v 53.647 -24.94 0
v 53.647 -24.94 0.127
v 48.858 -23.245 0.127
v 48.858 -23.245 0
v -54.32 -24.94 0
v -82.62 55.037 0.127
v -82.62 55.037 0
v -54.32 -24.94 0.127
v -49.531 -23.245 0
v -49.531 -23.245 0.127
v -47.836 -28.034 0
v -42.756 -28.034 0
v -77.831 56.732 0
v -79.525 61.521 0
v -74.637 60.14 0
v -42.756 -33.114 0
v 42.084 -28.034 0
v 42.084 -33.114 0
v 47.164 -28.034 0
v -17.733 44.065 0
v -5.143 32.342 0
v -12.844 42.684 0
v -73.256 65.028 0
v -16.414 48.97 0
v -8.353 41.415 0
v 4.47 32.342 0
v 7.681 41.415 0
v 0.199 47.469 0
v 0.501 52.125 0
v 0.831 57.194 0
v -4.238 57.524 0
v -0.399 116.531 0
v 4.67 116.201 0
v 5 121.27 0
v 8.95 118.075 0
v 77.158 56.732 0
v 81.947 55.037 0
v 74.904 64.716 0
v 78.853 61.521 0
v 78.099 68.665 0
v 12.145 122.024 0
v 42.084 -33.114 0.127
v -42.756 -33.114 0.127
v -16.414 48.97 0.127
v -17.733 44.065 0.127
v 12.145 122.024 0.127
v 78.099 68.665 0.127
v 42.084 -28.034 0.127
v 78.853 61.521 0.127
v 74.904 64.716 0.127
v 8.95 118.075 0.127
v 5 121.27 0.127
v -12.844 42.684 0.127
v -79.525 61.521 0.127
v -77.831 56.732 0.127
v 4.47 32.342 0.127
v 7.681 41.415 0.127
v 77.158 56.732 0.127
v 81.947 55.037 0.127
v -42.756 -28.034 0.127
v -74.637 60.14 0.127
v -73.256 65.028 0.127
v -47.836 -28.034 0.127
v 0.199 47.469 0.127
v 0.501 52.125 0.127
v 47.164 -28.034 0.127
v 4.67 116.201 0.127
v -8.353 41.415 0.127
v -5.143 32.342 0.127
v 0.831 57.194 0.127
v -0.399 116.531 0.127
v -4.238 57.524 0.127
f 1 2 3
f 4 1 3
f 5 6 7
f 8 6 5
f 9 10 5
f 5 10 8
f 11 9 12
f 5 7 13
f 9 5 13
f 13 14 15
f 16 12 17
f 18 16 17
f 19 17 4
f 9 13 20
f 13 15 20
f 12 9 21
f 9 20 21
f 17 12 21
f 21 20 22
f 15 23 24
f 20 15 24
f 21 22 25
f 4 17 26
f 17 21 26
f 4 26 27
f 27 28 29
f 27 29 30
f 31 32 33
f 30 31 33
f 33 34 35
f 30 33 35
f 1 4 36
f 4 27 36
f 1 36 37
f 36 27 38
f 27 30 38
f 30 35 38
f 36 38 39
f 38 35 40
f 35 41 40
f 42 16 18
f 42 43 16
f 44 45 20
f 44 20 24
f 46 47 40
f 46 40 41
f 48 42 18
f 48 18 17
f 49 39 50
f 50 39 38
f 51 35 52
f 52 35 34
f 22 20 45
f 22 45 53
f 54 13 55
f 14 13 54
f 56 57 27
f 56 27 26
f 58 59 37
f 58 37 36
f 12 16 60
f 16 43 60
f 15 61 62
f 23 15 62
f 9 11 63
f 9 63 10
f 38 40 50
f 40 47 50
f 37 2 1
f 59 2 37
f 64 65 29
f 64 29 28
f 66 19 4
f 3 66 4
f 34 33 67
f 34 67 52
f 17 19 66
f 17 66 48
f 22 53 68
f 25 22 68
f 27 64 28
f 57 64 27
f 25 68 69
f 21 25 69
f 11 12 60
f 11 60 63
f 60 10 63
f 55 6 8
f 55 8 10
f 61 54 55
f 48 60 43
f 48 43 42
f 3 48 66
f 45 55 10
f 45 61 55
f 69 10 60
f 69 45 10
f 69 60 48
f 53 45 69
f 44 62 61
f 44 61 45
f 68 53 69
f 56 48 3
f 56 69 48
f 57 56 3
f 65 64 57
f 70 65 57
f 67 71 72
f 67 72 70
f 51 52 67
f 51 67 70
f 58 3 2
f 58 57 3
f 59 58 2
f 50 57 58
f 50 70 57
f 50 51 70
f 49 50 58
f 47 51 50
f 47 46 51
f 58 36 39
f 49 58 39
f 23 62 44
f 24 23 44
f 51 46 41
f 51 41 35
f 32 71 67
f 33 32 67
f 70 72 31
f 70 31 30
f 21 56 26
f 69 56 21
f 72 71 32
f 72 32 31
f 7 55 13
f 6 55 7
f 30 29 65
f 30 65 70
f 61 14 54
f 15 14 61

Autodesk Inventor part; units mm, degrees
ref_plane "YZ Plane" through (0, 0, 0) normal (1, 0, 0) x (0, 1, 0)
ref_plane "XZ Plane" through (0, 0, 0) normal (0, 1, 0) x (-1, 0, 0)
ref_plane "XY Plane" through (0, 0, 0) normal (0, 0, 1) x (1, 0, 0)
sketch "Sketch1" plane through (0, 0, 0) normal (0, 0, 1) x (1, 0, 0)
  line L0 (-7.8362, 28.532) -> (7.1638, 28.532)
  line L1 (47.1638, -28.0341) -> (-47.8362, -28.0341)
  line L2 (7.1638, 28.532) -> (47.1638, -28.0341)
  line L3 (-7.8362, 28.532) -> (-47.8362, -28.0341)
  line L4 (-7.8362, 28.532) -> (-12.8438, 42.6835)
  line L5 (0.5011, 52.1252) -> (12.1714, 42.6835)
  line L6 (12.1714, 42.6835) -> (7.1638, 28.532)
  line L7 (-47.8362, -28.0341) -> (-79.5254, 61.5206)
  line L8 (-79.5254, 61.5206) -> (-12.8438, 42.6835)
  line L9 (47.1638, -28.0341) -> (78.853, 61.5206)
  line L10 (78.853, 61.5206) -> (12.1714, 42.6835)
  line L11 (78.853, 61.5206) -> (5.0003, 121.2702)
  line L12 (0.5011, 52.1252) -> (5.0003, 121.2702)
  point P0 (0, 0)
  point P1 (-0.3362, 28.532)
  point P2 (-0.3362, -28.0341)
  dimension "d0" = 69.28
  dimension "d1" = 95
  dimension "d2" = 15
  dimension "d3" = 56.566
  dimension "d4" = 69.28
  dimension "d16" = 15.0114
  dimension "d17" = 15.0114
  dimension "d18" = 15.0114
  dimension "d19" = 94.996
  dimension "d20" = 69.2912
  dimension "d21" = 94.996
  dimension "d22" = 69.2912
  dimension "d23" = 94.996
  dimension "d24" = 69.2912
extrude "Extrusion2" add sketch "Sketch1" along normal blind 0.127
sketch "Sketch2" plane through (0, 0, 0.127) normal (0, 0, 1) x (1, 0, 0)
  line L0 (47.1638, -28.0341) -> (78.853, 61.5206) projected
  line L1 (53.6474, -24.9397) -> (81.9474, 55.0369)
  line L2 (78.0988, 68.6651) -> (12.1448, 122.0244)
  line L3 (5.0003, 121.2702) -> (0.5011, 52.1252) projected
  line L4 (-0.3988, 116.5308) -> (-4.2384, 57.5244)
  line L5 (-79.5254, 61.5206) -> (-47.8362, -28.0341) projected
  line L6 (-82.6198, 55.0369) -> (-54.3198, -24.9397)
  line L7 (-42.7562, -33.1141) -> (42.0838, -33.1141)
  line L8 (-7.8362, 28.532) -> (-12.8438, 42.6835) projected
  line L9 (-12.8438, 42.6835) -> (-79.5254, 61.5206) projected
  line L10 (78.853, 61.5206) -> (5.0003, 121.2702) projected
  line L11 (-4.2384, 57.5244) -> (0.8309, 57.1945)
  line L12 (-0.3988, 116.5308) -> (4.6704, 116.2009)
  line L13 (12.1448, 122.0244) -> (8.9496, 118.075)
  line L14 (78.0988, 68.6651) -> (74.9036, 64.7157)
  line L15 (78.853, 61.5206) -> (5.0003, 121.2702) projected
  line L16 (81.9474, 55.0369) -> (77.1584, 56.7315)
  line L17 (53.6474, -24.9397) -> (48.8584, -23.2451)
  line L18 (42.0838, -33.1141) -> (42.0838, -28.0341)
  line L19 (-47.8362, -28.0341) -> (47.1638, -28.0341) projected
  line L20 (-42.7562, -33.1141) -> (-42.7562, -28.0341)
  line L21 (-49.5308, -23.2451) -> (-54.3198, -24.9397)
  line L22 (-77.8307, 56.7315) -> (-82.6198, 55.0369)
  line L23 (-12.8438, 42.6835) -> (-79.5254, 61.5206) projected
  line L24 (-74.6367, 60.1395) -> (-73.2557, 65.0282)
  line L25 (-17.7328, 44.0646) -> (-16.414, 48.9705)
  line L26 (-73.2557, 65.0282) -> (-16.414, 48.9705)
  line L27 (-12.8438, 42.6835) -> (-8.3534, 41.4151)
  line L28 (-7.8362, 28.532) -> (-5.1428, 32.3417)
  line L29 (7.1638, 28.532) -> (-7.8362, 28.532) projected
  line L30 (-8.3534, 41.4151) -> (-5.1428, 32.3417)
  line L31 (12.1714, 42.6835) -> (7.1638, 28.532) projected
  line L32 (7.1638, 28.532) -> (4.4702, 32.342)
  line L33 (12.1714, 42.6835) -> (7.6811, 41.4151)
  line L34 (0.5011, 52.1252) -> (0.1988, 47.469)
  line L35 (0.5011, 52.1252) -> (12.1714, 42.6835) projected
  line L36 (0.1988, 47.469) -> (7.6811, 41.4151)
  line L37 (7.6811, 41.4151) -> (4.4702, 32.342)
  line L38 (4.4702, 32.342) -> (-5.1428, 32.3417)
  line L39 (8.9496, 118.075) -> (74.9036, 64.7157)
  point P0 (0, 0)
  dimension "d34" = 5.08
  dimension "d35" = 5.08
  dimension "d38" = 5.08
  dimension "d39" = 5.08
  dimension "d42" = 5.08
  dimension "d43" = 5.08
  dimension "d46" = 5.08
  dimension "d47" = 5.08
  dimension "d50" = 5.08
  dimension "d51" = 5.08
  dimension "d56" = 5.08
  dimension "d58" = 5.08
  dimension "d64" = 54.74
  dimension "d65" = 3.81
  dimension "d66" = 54.74
  dimension "d67" = 3.81
  dimension "d68" = 54.74
  dimension "d69" = 3.81
  dimension "d70" = 54.74
  dimension "d71" = 3.81
  dimension "d72" = 54.74
  dimension "d73" = 3.81
  dimension "d76" = 5.08
extrude "Extrusion3" add sketch "Sketch2" against normal blind 0.127 contours L0 L16 L1 L17 | L18 L7 L20 L19 | L10 L13 L2 L14 | L21 L6 L22 L5 | L3 L11 L4 L12 | L24 L26 L25 L9 | L35 L33 L36 L34 | L27 L30 L28 L8 | L31 L32 L37 L33 | L28 L38 L32 L29
sketch "Sketch3" plane through (0, 0, 0.127) normal (0, 0, 1) x (1, 0, 0)
  line L0 (8.9496, 118.075) -> (74.9036, 64.7157)
  line L1 (78.853, 61.5206) -> (7.6811, 41.4151)
  line L2 (4.6704, 116.2009) -> (0.8309, 57.1945)
  line L3 (77.1584, 56.7315) -> (48.8584, -23.2451)
  line L4 (47.1638, -28.0341) -> (4.4702, 32.342)
  line L5 (42.0838, -28.0341) -> (-42.7562, -28.0341)
  line L6 (-5.1428, 32.3417) -> (-47.8362, -28.0341)
  line L7 (-49.5308, -23.2451) -> (-77.8307, 56.7315)
  line L8 (-74.6367, 60.1395) -> (-17.7328, 44.0646)
  line L9 (-12.8438, 42.6835) -> (-7.8364, 28.5324)
  line L10 (-7.8364, 28.5324) -> (7.164, 28.5324)
  line L11 (7.164, 28.5324) -> (12.1711, 42.6835)
  line L12 (12.1711, 42.6835) -> (0.5011, 52.1252)
properties part number "Nexus 7 3D hologram frame"
